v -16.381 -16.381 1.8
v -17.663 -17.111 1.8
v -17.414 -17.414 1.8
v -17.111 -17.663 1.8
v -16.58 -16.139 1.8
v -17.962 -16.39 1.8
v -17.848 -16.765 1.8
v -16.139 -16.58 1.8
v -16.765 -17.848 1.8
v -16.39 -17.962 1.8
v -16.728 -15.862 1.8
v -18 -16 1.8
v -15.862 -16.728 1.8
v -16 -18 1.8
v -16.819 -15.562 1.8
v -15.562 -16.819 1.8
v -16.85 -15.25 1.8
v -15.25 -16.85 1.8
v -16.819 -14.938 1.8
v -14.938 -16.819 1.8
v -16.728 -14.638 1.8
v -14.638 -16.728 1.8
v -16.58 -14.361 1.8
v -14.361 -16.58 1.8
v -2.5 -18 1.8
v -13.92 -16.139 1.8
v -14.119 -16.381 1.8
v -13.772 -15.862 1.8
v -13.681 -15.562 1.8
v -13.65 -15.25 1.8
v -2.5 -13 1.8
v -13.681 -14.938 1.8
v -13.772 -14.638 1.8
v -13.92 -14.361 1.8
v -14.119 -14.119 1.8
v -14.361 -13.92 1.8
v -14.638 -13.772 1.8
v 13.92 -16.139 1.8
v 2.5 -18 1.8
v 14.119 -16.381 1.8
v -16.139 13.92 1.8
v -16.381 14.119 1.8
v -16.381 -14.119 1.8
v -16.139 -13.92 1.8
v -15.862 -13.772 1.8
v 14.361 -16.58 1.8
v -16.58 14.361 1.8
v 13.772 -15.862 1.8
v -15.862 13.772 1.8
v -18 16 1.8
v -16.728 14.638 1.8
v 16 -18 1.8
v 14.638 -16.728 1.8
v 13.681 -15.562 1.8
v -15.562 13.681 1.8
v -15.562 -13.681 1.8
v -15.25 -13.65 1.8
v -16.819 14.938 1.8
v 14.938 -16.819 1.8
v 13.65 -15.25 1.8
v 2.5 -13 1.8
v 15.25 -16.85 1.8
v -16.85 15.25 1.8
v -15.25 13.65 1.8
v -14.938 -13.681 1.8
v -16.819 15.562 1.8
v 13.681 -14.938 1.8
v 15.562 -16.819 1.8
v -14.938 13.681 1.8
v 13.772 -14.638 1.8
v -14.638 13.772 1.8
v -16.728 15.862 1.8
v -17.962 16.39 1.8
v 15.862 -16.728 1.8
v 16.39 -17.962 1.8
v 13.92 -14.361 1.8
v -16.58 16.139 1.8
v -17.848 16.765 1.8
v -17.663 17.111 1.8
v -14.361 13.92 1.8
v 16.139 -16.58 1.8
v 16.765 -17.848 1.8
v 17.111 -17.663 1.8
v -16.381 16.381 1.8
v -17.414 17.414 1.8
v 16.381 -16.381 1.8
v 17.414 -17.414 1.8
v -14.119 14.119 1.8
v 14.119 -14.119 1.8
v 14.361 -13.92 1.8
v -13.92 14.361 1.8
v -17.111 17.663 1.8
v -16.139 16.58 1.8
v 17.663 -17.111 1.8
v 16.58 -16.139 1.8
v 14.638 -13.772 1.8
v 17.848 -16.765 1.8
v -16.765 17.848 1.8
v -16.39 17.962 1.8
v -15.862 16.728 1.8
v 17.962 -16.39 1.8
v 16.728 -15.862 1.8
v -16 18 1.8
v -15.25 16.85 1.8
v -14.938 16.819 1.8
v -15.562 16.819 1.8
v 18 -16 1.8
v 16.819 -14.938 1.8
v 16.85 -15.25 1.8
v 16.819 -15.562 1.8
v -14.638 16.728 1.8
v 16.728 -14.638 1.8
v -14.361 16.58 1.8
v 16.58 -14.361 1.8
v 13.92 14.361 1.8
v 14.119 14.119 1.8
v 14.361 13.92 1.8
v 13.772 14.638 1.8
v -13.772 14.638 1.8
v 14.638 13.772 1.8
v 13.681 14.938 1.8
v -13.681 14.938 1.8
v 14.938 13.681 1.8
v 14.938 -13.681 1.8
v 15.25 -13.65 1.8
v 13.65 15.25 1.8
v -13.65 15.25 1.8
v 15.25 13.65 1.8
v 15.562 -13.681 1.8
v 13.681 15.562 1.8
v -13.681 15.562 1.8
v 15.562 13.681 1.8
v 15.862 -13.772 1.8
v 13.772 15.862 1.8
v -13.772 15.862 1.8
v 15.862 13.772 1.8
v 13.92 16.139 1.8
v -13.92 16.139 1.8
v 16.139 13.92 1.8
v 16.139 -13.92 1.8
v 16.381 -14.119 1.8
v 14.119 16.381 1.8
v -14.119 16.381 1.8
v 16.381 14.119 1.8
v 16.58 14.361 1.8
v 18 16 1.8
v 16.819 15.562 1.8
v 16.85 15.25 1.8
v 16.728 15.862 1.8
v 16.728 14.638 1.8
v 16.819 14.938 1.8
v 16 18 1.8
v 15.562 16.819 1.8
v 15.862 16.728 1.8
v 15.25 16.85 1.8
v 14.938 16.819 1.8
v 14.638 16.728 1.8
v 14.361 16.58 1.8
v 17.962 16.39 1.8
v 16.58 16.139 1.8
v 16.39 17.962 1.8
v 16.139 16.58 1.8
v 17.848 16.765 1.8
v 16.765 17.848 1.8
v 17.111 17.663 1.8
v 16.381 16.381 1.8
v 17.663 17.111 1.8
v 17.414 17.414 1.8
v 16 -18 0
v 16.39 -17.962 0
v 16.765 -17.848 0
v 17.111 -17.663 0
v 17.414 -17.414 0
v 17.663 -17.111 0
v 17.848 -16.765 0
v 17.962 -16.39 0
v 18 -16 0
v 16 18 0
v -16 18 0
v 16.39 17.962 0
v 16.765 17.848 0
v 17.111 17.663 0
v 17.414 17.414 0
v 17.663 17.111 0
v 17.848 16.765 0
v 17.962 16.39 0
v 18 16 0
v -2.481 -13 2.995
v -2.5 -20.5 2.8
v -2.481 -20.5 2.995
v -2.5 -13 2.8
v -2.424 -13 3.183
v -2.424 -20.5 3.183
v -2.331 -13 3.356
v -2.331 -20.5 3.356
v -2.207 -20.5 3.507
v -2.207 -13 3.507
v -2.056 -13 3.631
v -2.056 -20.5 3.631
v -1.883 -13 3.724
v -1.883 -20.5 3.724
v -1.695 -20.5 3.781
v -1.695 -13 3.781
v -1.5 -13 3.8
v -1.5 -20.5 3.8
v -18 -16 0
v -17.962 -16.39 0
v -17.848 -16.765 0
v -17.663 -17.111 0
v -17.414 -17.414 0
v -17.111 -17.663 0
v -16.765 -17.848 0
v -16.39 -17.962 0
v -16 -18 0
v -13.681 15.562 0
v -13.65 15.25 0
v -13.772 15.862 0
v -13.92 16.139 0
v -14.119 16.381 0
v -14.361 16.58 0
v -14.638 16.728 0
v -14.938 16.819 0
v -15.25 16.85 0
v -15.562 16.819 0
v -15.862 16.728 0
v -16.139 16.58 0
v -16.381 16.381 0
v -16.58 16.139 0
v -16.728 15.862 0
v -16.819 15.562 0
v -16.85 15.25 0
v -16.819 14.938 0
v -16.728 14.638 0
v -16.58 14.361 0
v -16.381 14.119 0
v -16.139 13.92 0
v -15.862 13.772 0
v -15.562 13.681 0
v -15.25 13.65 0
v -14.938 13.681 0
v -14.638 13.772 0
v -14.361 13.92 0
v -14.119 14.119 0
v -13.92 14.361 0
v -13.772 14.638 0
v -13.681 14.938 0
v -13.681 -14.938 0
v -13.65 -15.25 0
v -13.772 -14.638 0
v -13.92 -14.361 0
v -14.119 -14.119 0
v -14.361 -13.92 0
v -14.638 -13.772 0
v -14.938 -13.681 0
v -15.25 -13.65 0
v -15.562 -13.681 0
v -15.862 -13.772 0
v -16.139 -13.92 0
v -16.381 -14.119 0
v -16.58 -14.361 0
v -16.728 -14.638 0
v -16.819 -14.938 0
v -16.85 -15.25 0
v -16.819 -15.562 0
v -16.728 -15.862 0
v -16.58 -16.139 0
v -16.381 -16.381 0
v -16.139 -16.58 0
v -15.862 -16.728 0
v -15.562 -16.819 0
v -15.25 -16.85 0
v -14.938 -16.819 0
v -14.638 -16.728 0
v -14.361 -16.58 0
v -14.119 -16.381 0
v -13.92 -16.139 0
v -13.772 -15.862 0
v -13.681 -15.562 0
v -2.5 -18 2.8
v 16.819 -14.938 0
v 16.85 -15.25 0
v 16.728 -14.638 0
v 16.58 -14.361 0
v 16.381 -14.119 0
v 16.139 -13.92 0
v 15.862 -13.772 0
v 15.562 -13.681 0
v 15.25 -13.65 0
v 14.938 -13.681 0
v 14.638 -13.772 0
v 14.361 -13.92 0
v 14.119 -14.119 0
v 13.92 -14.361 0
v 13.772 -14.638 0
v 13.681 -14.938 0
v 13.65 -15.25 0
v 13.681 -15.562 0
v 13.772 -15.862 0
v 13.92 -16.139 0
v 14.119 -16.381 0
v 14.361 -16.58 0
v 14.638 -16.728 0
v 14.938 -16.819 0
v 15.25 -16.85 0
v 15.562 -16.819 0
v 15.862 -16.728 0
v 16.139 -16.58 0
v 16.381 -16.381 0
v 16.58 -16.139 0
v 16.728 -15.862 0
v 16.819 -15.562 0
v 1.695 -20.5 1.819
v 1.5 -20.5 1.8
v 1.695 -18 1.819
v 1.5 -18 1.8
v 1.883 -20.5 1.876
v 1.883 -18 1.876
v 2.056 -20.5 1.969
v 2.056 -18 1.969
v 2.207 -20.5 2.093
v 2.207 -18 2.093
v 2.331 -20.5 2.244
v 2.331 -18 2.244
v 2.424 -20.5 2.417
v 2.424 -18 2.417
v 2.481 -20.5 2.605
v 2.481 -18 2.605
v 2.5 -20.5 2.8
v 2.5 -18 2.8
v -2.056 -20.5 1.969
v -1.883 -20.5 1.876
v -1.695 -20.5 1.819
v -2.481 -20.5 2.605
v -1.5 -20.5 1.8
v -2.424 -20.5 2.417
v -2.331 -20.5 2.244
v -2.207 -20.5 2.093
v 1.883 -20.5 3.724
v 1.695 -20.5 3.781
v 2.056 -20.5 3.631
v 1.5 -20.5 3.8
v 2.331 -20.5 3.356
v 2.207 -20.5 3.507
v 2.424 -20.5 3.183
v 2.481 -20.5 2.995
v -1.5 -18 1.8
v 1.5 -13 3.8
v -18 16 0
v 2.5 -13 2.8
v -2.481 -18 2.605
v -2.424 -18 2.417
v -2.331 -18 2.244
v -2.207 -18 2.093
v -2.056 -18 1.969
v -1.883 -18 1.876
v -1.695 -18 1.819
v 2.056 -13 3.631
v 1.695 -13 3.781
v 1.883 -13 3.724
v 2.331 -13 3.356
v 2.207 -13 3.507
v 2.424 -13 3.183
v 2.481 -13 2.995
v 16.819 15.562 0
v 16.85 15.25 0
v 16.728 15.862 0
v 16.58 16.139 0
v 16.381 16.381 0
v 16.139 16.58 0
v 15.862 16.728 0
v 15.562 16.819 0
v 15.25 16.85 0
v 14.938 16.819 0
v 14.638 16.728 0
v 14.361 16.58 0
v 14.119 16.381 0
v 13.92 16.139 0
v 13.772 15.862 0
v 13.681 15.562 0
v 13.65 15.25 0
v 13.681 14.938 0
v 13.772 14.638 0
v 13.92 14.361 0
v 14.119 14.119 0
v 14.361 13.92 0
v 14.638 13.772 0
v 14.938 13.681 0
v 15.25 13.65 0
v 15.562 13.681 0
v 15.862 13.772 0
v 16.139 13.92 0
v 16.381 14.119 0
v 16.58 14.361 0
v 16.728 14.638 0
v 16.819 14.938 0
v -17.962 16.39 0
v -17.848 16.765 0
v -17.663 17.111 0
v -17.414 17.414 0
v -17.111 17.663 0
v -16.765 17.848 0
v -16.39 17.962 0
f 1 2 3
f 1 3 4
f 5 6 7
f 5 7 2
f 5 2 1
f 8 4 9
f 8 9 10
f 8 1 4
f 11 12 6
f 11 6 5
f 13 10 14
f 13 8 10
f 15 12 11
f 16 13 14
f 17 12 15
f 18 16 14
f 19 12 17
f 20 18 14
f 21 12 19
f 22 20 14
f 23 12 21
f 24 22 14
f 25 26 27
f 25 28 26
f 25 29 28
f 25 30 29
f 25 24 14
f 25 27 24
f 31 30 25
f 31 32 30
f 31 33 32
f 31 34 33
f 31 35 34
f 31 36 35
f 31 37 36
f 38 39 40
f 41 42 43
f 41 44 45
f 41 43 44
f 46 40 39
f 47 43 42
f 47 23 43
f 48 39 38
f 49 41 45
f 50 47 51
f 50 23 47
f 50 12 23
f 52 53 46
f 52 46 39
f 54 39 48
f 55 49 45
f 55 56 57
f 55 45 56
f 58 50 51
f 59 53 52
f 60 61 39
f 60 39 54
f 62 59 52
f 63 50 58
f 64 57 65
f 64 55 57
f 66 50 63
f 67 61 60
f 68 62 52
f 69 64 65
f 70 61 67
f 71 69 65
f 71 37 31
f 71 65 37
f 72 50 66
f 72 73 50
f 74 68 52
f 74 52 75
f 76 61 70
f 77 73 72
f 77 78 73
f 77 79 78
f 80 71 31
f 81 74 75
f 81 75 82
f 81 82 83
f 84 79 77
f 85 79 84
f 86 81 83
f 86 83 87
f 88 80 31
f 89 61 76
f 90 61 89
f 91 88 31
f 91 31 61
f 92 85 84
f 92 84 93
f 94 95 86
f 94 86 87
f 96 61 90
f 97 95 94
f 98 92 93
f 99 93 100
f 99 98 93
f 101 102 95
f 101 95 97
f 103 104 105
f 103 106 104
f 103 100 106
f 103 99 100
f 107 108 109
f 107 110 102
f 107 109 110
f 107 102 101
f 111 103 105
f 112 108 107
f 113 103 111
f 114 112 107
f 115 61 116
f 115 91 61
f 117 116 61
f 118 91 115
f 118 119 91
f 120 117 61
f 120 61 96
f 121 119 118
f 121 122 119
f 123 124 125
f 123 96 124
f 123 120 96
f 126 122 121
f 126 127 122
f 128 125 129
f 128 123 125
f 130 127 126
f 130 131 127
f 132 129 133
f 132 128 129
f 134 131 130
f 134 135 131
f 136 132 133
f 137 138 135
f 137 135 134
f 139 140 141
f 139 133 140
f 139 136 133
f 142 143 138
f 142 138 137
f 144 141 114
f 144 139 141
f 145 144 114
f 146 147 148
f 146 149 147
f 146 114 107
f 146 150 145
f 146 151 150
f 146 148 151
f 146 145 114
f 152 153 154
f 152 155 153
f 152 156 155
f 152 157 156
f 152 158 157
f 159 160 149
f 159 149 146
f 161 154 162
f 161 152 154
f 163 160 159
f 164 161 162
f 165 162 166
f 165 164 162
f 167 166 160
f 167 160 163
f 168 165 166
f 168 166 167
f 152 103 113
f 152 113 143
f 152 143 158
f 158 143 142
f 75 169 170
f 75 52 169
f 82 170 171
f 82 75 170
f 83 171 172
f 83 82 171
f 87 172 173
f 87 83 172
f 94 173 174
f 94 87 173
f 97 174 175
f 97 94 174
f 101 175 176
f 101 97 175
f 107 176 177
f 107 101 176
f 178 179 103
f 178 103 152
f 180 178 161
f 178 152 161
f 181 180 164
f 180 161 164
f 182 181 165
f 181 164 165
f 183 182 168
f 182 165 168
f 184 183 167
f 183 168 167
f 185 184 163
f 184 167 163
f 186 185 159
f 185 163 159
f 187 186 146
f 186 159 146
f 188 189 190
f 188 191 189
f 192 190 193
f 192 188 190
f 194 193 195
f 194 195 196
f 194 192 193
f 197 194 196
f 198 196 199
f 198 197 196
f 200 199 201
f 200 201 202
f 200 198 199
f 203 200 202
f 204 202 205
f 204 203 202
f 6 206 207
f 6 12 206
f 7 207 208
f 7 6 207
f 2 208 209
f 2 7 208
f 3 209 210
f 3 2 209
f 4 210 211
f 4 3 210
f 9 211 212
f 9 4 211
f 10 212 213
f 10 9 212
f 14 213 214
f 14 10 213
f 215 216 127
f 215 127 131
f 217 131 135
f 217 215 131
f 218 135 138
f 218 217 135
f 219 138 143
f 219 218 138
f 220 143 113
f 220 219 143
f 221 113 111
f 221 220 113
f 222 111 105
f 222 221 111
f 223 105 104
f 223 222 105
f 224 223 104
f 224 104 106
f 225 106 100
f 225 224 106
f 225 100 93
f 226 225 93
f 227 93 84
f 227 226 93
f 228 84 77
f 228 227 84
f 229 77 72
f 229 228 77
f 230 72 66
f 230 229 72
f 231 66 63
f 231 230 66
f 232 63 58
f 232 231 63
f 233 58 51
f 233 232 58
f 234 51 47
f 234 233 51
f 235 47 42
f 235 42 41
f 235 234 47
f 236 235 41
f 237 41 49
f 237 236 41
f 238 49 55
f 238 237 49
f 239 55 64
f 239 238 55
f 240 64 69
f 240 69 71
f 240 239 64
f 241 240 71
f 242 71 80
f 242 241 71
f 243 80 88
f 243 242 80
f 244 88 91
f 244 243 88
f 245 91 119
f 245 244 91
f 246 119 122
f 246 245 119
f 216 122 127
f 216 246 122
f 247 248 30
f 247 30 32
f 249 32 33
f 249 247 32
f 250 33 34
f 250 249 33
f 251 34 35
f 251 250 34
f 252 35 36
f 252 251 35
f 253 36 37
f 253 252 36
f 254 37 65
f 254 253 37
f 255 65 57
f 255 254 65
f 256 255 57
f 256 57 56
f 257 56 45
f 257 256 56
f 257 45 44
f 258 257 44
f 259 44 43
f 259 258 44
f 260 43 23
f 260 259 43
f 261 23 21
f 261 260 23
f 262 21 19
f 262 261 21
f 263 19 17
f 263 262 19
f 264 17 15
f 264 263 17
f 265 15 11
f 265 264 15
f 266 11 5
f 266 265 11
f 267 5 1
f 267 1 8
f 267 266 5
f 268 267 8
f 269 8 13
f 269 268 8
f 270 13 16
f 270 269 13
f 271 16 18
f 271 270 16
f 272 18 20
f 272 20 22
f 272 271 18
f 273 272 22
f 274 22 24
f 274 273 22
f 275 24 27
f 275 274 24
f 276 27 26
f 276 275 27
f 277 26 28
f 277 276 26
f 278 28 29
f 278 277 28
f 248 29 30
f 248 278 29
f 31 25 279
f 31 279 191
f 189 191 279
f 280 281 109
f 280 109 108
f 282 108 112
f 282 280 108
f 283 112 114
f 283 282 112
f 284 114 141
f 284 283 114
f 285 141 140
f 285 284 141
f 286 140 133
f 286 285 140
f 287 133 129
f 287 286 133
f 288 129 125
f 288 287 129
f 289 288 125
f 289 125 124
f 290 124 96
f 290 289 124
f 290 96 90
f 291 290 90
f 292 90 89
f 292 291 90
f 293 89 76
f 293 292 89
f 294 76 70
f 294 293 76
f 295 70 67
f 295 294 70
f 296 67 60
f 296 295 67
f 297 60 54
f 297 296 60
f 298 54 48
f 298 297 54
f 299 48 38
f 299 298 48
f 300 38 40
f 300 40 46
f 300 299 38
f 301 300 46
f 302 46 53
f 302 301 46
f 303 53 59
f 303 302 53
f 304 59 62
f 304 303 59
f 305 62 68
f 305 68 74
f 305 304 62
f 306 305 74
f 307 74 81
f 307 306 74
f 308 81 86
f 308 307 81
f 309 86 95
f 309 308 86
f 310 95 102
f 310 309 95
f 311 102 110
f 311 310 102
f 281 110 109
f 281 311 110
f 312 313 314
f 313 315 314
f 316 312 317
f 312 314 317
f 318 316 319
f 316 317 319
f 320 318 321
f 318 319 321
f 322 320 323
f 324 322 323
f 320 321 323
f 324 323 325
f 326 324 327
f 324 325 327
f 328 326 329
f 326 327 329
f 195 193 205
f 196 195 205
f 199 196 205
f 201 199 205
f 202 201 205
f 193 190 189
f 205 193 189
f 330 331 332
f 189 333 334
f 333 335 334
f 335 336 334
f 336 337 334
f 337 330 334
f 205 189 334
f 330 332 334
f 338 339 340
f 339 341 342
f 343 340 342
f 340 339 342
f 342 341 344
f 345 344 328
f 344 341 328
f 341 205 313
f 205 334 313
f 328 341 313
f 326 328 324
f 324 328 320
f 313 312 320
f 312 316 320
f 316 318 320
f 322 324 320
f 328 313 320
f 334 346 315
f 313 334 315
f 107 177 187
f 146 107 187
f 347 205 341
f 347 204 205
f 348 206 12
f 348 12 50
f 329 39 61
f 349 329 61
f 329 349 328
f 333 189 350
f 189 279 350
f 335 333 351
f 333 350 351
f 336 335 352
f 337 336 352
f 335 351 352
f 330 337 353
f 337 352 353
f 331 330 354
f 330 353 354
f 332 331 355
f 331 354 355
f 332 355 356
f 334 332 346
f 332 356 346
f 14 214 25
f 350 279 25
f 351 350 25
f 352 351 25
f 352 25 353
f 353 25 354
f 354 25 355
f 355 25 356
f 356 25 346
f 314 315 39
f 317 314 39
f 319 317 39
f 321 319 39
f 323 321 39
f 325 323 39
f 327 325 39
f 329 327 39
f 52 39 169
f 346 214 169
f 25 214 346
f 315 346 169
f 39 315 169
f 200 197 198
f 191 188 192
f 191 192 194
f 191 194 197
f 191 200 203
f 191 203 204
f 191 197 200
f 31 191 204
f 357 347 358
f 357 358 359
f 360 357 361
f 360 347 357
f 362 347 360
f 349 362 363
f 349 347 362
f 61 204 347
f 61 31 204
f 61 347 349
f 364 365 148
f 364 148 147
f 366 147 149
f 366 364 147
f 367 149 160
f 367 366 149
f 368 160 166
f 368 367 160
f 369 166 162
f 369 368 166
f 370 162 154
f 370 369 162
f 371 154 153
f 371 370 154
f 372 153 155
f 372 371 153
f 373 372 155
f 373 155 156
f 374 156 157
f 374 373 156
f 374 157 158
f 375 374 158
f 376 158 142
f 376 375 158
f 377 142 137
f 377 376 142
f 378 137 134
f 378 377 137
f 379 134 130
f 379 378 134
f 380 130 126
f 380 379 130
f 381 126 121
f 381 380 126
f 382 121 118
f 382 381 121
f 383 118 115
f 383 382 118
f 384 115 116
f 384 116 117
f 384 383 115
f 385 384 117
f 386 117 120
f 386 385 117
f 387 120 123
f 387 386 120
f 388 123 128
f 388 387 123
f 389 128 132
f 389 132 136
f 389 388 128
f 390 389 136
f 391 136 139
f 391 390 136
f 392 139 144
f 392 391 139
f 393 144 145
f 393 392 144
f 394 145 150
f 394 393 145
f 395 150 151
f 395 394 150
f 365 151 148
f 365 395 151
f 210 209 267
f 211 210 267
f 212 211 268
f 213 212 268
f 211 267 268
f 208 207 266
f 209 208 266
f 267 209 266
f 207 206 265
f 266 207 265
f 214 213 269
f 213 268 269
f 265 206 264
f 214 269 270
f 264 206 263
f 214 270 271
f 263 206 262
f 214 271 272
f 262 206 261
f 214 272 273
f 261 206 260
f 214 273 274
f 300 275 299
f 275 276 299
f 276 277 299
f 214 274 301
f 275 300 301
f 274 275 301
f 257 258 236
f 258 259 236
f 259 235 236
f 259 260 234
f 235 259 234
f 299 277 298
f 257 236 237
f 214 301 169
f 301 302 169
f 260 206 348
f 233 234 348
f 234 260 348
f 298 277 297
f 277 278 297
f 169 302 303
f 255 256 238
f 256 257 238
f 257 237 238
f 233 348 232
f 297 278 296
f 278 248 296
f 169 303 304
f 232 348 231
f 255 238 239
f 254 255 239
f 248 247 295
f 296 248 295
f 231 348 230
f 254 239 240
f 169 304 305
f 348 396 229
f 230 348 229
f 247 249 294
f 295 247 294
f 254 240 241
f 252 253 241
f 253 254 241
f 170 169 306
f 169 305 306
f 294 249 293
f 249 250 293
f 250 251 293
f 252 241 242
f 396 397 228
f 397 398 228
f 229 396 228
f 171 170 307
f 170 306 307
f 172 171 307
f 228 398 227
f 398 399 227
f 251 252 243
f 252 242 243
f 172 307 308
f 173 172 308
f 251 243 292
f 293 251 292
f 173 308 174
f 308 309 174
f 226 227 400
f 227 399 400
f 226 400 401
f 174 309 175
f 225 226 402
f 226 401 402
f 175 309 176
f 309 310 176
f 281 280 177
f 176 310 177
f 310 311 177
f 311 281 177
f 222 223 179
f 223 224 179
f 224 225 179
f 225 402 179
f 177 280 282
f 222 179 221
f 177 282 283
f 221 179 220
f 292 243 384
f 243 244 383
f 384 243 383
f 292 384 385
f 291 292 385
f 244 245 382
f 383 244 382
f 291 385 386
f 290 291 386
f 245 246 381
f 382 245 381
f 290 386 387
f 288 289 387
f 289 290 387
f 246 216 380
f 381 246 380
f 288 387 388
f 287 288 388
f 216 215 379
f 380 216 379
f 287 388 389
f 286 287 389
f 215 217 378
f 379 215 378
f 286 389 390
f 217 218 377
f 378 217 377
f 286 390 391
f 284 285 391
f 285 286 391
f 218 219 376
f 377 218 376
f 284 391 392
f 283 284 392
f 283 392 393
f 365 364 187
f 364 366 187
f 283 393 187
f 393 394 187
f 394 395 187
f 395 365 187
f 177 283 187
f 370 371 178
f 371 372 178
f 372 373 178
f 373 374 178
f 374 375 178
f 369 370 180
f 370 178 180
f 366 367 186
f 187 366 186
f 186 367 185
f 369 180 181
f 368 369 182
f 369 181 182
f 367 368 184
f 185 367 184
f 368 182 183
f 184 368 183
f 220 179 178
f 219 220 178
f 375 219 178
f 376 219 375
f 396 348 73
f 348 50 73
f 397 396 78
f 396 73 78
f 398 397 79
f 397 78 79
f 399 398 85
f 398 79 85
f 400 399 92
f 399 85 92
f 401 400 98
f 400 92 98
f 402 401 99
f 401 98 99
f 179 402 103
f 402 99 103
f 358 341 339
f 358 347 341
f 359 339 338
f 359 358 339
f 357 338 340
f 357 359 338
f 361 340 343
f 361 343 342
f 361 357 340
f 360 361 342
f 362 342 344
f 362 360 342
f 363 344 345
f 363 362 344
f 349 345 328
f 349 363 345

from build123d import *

# Parameters (mm, degrees)
F0_W     = 36
F0_H     = 36
F0_R     = 1.6
F1_DEPTH = 1.8
F2_R     = 2
F3_W     = 5
F3_H     = 7.5
F4_DEPTH = 2
F5_R     = 0.99999


# Not quite as in the source:
# - a fillet or chamfer is up to 0.001 mm smaller than in the source, because OpenCascade refuses the exact size


with BuildPart() as f1:
    # F0 (on Top) → F1 (new body)
    with BuildSketch(Plane.XY):
        Rectangle(F0_W, F0_H)
        with Locations((-15.25, -15.25)):
            Circle(F0_R, mode=Mode.SUBTRACT)
        with Locations((15.25, -15.25)):
            Circle(F0_R, mode=Mode.SUBTRACT)
        with Locations((-15.25, 15.25)):
            Circle(F0_R, mode=Mode.SUBTRACT)
        with Locations((15.25, 15.25)):
            Circle(F0_R, mode=Mode.SUBTRACT)
    extrude(amount=F1_DEPTH)

    # F2
    f2_edges = [f1.edges().sort_by_distance(p)[0] for p in [
        (-18, -18, 0.9),
        (18, -18, 0.9),
        (18, 18, 0.9),
        (-18, 18, 0.9),
    ]]
    fillet(f2_edges, radius=F2_R)

    # F3 (on face) → F4 (join)
    with BuildSketch(Plane.XY.offset(1.8)):
        with Locations((0, -16.75)):
            Rectangle(F3_W, F3_H)
    extrude(amount=F4_DEPTH)

    # F5 (radius 1 in the source; OpenCascade refuses exactly that, so slightly less here)
    f5_edges = [f1.edges().sort_by_distance(p)[0] for p in [
        (-2.5, -19.25, 1.8),
        (-2.5, -16.75, 3.8),
        (2.5, -16.75, 3.8),
        (2.5, -19.25, 1.8),
    ]]
    fillet(f5_edges, radius=F5_R)


solid = f1.part
